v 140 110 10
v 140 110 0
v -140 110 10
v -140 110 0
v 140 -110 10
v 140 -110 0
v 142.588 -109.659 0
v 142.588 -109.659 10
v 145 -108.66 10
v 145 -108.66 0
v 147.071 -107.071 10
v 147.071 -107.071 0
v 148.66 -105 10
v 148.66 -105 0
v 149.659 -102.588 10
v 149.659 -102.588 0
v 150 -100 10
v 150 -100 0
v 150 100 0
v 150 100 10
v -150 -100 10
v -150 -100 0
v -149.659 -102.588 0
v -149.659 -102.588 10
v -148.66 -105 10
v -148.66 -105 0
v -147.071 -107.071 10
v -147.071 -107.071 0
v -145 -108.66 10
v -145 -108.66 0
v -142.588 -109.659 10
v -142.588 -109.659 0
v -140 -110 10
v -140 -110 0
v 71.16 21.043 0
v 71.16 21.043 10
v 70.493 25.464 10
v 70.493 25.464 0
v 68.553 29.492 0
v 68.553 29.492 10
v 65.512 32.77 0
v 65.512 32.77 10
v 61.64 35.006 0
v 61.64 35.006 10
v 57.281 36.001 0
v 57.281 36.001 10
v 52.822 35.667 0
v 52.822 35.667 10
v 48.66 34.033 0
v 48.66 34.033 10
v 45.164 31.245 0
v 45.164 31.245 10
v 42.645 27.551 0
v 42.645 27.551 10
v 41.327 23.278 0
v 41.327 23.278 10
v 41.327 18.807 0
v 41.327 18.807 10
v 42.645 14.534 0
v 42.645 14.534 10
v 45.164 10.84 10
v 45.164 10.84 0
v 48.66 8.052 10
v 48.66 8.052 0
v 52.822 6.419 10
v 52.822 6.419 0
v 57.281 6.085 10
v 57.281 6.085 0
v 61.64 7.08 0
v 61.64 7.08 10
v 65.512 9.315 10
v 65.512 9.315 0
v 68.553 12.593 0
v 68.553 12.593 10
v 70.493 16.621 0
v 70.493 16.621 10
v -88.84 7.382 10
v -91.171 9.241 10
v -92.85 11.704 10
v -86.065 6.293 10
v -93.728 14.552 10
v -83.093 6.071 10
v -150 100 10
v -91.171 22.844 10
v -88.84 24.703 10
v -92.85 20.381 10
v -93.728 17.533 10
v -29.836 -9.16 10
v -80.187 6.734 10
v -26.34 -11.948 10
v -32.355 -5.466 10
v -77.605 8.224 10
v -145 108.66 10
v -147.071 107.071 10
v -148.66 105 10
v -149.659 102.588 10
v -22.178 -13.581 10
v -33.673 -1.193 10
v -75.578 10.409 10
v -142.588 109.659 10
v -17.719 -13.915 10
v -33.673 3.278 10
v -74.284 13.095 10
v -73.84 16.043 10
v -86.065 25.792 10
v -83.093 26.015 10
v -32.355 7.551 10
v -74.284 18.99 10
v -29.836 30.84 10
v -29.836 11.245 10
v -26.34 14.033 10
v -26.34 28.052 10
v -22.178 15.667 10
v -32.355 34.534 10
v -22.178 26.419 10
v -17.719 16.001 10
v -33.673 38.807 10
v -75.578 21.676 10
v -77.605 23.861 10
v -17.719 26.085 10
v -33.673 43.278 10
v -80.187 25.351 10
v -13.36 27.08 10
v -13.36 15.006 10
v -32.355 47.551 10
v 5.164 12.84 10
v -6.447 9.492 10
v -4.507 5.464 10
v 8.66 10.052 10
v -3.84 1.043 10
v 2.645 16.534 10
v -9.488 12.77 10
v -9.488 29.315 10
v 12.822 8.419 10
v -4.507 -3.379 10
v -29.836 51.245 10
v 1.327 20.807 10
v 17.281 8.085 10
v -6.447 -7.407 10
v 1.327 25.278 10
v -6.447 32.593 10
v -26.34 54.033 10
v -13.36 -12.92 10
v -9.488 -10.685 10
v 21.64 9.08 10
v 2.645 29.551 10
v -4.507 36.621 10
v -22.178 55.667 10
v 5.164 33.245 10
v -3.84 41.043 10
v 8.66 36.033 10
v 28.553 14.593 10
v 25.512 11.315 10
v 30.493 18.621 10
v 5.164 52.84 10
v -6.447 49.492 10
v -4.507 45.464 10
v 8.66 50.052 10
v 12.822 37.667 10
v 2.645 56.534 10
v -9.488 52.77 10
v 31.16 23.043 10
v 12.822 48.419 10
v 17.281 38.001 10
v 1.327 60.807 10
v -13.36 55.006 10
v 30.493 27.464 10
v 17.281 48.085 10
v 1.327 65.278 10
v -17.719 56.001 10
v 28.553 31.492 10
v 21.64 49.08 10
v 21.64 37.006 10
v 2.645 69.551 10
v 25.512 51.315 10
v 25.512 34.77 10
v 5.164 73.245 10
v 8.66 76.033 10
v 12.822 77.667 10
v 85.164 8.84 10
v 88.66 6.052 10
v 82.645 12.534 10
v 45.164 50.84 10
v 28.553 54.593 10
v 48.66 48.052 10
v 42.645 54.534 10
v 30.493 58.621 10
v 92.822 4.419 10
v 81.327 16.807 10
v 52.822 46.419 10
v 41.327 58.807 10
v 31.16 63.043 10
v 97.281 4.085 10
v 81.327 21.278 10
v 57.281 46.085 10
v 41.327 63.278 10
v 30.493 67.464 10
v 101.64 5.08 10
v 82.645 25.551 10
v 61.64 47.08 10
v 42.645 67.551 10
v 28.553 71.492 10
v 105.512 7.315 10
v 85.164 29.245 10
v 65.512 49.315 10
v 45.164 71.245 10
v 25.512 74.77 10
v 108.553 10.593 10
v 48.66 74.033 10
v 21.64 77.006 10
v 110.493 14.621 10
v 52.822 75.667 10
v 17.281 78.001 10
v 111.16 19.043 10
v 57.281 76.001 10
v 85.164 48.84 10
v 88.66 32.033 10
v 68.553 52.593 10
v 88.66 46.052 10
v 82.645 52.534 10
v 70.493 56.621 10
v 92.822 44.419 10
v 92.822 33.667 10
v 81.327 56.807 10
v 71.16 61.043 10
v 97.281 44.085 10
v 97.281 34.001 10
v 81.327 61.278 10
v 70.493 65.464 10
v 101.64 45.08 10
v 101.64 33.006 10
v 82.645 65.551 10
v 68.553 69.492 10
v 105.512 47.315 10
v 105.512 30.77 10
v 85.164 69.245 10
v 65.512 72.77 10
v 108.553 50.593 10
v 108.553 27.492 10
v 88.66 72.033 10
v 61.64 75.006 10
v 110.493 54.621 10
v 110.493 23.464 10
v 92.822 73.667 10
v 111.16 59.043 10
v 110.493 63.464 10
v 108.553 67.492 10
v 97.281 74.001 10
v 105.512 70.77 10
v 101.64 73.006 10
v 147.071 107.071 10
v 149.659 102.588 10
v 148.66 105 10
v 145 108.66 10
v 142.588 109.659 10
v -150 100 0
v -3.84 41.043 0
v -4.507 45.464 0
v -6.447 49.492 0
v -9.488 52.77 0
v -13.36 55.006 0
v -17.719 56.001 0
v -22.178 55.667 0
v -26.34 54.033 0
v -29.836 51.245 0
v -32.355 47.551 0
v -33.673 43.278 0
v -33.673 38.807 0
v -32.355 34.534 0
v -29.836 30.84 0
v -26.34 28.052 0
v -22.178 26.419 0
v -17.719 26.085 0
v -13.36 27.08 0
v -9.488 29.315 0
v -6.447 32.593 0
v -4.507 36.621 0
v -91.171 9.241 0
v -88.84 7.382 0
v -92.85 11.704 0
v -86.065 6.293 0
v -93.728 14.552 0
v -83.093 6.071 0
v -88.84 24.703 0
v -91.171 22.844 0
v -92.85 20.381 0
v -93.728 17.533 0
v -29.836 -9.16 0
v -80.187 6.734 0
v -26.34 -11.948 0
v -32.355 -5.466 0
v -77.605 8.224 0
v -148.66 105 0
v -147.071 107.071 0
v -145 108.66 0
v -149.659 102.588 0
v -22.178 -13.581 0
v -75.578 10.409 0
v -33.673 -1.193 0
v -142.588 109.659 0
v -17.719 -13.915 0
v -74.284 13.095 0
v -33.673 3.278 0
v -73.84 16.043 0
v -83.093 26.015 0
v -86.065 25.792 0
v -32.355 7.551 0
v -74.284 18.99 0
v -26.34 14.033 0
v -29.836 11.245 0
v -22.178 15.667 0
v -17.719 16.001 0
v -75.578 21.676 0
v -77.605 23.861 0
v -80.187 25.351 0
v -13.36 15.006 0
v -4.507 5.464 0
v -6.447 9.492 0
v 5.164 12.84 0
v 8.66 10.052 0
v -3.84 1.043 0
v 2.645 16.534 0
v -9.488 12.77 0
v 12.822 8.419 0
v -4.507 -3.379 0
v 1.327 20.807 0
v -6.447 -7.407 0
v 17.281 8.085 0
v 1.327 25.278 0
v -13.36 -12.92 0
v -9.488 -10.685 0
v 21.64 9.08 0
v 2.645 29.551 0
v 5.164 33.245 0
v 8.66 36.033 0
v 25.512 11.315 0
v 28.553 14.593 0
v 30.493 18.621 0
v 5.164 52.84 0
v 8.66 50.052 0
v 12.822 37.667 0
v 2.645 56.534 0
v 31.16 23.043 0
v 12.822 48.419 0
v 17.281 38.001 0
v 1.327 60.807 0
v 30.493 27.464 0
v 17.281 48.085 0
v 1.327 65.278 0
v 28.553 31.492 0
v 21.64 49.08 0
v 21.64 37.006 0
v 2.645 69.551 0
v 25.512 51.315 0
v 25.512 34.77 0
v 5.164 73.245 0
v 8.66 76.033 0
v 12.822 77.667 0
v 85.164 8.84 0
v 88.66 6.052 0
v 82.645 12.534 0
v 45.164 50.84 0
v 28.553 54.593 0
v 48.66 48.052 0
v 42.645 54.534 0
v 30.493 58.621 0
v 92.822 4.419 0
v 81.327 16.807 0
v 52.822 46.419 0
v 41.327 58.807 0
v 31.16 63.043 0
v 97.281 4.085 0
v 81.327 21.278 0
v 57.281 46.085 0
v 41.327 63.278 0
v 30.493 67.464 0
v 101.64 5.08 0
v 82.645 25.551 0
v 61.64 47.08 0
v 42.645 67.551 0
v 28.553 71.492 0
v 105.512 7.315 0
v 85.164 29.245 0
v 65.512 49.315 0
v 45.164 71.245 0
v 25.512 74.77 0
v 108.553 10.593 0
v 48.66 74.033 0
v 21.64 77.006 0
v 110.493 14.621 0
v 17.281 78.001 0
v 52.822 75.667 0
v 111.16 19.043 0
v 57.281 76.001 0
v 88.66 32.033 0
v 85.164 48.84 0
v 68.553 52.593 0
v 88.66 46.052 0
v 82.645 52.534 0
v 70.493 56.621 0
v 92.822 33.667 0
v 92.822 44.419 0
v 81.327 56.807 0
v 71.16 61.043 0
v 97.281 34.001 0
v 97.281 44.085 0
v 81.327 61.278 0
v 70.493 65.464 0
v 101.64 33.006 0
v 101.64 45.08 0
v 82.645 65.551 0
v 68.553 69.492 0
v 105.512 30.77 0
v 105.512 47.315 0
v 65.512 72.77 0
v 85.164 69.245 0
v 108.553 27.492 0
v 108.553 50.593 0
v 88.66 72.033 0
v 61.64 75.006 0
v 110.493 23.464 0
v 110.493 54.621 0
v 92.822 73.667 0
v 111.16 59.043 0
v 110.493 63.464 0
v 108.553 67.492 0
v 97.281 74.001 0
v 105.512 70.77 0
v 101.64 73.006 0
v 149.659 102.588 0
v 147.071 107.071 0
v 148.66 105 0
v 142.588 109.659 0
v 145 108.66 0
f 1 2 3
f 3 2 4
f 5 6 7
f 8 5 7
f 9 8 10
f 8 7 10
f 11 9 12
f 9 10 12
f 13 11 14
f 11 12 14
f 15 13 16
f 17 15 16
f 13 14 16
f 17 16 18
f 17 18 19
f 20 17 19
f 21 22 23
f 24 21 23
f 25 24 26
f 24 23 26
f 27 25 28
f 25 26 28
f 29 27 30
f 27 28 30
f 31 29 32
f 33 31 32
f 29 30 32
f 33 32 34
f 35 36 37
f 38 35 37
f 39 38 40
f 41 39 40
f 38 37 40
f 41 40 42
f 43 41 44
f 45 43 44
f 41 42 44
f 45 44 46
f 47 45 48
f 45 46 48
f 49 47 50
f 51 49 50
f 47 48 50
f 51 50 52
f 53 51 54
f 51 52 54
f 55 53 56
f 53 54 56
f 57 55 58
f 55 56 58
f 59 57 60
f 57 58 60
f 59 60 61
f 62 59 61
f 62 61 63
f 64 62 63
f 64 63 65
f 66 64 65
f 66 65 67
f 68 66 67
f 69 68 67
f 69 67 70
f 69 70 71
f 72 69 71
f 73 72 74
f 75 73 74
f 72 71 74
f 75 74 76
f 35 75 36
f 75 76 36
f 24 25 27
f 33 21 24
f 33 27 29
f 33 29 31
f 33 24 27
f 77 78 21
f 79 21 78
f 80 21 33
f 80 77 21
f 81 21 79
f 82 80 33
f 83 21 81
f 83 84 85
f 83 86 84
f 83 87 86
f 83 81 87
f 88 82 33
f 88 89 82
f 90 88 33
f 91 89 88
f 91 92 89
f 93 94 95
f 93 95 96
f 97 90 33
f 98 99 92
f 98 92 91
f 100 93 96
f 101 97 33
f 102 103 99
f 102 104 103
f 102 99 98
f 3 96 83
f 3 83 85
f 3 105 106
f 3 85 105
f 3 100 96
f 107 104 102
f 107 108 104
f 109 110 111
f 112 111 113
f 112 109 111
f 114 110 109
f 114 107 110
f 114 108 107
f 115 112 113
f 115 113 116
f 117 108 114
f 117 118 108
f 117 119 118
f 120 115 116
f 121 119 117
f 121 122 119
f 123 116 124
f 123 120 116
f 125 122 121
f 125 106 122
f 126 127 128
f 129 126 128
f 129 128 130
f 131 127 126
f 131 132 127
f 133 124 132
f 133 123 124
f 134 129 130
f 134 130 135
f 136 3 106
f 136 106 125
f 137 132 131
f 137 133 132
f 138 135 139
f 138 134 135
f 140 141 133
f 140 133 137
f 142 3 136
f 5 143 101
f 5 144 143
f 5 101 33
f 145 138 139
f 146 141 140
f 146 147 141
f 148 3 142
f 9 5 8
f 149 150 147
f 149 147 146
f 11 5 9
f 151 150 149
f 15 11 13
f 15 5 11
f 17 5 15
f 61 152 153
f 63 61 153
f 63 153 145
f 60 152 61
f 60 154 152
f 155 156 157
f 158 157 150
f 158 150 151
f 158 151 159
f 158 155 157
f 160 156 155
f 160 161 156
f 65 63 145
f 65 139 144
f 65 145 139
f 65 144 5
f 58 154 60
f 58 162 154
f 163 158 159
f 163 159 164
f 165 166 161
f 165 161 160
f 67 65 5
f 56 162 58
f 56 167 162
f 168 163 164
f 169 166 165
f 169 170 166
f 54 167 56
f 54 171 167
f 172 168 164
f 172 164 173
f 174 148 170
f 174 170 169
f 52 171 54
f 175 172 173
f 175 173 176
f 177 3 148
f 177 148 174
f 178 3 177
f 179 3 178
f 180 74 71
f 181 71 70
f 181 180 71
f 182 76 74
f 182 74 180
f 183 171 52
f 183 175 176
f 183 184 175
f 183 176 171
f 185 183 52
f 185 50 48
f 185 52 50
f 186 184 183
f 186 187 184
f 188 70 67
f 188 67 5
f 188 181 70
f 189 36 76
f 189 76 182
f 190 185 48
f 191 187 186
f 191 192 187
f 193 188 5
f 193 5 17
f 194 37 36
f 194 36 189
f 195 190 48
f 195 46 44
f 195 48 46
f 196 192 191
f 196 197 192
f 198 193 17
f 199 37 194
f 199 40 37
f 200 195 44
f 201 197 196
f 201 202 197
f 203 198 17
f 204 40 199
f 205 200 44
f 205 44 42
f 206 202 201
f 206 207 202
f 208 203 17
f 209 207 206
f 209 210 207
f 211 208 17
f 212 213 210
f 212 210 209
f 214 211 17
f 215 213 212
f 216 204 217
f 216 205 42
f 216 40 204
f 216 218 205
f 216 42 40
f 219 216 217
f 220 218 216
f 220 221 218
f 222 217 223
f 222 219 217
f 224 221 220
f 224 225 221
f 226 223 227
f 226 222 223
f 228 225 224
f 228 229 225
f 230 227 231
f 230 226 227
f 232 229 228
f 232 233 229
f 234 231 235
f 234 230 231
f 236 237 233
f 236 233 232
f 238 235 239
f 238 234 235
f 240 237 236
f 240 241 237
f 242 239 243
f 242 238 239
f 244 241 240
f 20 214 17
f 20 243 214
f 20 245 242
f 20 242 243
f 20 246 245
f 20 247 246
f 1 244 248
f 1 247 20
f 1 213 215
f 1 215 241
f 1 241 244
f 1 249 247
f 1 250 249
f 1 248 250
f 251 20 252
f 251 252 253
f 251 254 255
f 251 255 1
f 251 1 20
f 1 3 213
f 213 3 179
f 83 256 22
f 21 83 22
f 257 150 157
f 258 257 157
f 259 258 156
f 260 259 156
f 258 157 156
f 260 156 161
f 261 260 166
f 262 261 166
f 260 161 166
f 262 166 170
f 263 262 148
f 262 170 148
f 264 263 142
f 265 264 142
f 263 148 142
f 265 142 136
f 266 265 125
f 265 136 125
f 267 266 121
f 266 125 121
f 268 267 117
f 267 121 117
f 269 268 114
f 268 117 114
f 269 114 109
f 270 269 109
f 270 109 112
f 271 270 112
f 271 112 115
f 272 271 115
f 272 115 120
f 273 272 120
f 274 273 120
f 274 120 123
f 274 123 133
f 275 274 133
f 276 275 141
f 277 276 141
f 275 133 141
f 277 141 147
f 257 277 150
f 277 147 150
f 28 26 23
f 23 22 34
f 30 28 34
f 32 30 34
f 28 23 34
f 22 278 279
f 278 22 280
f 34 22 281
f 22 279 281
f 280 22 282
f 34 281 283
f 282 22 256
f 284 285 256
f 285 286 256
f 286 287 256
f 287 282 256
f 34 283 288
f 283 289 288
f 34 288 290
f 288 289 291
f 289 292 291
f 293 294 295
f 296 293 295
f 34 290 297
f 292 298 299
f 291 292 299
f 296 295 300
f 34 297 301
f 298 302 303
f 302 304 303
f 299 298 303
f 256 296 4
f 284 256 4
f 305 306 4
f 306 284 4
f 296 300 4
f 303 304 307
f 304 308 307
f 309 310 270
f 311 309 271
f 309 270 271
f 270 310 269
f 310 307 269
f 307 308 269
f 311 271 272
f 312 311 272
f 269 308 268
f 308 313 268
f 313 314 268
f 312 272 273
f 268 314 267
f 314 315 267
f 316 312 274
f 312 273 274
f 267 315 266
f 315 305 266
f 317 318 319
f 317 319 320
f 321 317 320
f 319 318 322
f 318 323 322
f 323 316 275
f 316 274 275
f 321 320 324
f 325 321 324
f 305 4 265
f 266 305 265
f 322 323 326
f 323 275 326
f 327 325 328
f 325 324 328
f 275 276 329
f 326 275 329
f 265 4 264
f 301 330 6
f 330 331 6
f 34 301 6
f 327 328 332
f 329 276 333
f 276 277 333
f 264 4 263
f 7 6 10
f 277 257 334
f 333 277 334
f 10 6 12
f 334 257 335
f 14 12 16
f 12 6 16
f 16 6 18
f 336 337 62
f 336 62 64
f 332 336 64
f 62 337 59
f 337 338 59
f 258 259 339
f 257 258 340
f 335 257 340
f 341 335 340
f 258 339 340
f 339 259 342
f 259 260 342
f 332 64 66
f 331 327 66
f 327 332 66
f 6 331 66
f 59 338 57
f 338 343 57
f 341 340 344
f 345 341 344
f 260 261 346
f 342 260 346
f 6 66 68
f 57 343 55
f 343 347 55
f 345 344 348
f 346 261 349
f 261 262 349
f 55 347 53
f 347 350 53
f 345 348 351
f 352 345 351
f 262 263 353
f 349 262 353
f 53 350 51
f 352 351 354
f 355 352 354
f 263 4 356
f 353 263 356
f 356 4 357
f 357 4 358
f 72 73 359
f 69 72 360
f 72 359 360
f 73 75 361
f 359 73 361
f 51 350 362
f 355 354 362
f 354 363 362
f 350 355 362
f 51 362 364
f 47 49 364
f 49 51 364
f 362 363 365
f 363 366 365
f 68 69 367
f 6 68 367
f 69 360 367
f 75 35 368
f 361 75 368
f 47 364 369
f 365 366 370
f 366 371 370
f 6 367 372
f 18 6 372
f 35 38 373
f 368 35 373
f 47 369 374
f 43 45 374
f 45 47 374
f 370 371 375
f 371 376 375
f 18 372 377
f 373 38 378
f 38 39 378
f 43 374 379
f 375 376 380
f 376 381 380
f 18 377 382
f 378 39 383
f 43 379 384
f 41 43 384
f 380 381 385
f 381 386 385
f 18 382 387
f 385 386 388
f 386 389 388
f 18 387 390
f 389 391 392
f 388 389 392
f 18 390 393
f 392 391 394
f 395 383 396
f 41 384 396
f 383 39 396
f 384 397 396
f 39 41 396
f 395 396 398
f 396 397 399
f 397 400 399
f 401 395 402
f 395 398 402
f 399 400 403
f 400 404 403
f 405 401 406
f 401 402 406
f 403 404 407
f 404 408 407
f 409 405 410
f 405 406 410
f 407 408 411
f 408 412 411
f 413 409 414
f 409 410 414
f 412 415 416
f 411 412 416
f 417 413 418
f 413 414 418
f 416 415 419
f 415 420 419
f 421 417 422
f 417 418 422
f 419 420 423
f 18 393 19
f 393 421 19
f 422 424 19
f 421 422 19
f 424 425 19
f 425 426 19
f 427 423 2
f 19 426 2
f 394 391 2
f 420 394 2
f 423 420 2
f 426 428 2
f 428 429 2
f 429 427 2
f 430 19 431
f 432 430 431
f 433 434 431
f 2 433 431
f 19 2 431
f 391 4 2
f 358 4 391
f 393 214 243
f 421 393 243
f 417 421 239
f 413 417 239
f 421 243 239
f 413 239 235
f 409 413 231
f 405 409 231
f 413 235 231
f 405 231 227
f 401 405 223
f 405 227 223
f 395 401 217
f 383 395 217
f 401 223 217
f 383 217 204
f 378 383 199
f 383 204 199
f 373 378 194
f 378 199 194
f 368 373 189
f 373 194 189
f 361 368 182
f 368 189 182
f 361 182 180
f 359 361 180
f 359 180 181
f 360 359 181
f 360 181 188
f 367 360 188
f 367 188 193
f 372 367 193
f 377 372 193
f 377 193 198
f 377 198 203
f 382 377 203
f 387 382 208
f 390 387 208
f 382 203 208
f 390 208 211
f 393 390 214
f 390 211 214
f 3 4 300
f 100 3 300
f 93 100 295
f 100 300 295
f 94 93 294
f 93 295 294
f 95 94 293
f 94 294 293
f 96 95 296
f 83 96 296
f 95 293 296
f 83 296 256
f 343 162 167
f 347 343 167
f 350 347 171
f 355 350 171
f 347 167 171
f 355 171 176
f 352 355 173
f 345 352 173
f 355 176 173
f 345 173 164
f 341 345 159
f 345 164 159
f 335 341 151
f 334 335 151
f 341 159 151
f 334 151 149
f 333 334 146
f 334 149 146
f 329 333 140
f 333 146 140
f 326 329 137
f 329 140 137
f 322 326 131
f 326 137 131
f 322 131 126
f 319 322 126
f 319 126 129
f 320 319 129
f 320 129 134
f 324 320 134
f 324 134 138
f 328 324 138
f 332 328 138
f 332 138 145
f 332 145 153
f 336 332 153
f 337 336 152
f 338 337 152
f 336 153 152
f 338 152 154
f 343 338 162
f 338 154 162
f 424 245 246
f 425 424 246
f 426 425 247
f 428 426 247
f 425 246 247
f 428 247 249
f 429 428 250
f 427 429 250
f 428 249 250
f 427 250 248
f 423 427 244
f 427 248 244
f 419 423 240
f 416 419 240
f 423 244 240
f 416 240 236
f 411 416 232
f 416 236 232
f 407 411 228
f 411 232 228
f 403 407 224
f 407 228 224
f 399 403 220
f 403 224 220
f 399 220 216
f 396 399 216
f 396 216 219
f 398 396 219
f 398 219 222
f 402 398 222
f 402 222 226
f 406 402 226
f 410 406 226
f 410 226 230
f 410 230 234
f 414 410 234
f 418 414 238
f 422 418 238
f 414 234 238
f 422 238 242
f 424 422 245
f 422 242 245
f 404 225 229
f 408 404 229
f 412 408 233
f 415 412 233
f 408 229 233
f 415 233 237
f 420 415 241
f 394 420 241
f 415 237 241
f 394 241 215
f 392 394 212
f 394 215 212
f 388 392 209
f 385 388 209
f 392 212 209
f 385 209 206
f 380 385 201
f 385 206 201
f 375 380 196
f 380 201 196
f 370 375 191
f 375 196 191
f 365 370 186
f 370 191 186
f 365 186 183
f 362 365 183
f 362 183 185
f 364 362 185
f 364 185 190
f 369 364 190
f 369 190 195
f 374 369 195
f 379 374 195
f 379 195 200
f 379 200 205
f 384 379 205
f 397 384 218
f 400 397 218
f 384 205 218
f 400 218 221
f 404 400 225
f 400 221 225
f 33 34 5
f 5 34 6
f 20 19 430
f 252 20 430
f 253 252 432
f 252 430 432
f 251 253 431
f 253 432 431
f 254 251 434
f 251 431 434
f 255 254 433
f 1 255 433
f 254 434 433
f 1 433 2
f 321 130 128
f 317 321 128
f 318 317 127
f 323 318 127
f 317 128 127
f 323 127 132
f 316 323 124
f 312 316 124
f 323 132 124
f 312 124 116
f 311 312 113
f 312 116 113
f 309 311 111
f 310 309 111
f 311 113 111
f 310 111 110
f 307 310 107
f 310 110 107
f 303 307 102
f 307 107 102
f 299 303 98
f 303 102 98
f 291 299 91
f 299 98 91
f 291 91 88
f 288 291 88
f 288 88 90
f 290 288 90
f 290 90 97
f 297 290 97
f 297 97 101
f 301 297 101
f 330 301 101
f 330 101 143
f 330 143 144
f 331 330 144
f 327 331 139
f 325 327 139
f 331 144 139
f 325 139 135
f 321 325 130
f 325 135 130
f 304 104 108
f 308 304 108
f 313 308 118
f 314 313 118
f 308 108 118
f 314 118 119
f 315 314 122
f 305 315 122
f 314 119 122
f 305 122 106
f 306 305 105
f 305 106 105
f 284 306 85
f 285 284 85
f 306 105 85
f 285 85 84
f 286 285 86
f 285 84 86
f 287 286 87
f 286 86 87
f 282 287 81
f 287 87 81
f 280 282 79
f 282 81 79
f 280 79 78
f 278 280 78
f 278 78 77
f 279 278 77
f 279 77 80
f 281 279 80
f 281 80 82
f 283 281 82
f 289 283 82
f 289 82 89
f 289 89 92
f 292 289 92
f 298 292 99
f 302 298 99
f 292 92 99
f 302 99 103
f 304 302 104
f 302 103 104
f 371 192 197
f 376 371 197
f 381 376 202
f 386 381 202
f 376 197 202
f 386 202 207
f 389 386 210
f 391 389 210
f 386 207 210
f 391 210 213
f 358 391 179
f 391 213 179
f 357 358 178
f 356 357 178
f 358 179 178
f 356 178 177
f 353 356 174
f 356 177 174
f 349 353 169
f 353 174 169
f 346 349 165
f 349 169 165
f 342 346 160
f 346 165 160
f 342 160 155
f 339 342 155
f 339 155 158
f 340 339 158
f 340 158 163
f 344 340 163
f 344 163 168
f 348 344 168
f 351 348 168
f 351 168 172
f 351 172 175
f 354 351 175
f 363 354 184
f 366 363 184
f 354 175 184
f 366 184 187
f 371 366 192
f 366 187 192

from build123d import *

# Parameters (mm, degrees)
F1_DEPTH = 10
F2_R     = 10
F2_R_2   = 15
F3_DEPTH = 10


with BuildPart() as f1:
    # F0 (on Top) → F1 (new body)
    with BuildSketch(Plane.XY):
        with BuildLine():
            Line((140, 110), (-140, 110))
            ThreePointArc((-140, 110), (-147.071068, 107.071068), (-150, 100))
            Line((-150, 100), (-150, -100))
            ThreePointArc((-150, -100), (-147.071068, -107.071068), (-140, -110))
            Line((-140, -110), (140, -110))
            ThreePointArc((140, -110), (147.071068, -107.071068), (150, -100))
            Line((150, -100), (150, 100))
            ThreePointArc((150, 100), (147.071068, 107.071068), (140, 110))
        make_face()
    extrude(amount=F1_DEPTH)

    # F2 (on face) → F3 (cut)
    with BuildSketch(Plane.XY.offset(10)):
        with Locations((-83.84011, 16.042637)):
            Circle(F2_R)
        with Locations((-18.84011, 41.042637)):
            Circle(F2_R_2)
        with Locations((16.15989, 63.042637)):
            Circle(F2_R_2)
        with Locations((56.15989, 61.042637)):
            Circle(F2_R_2)
        with Locations((96.15989, 59.042637)):
            Circle(F2_R_2)
        with Locations((96.15989, 19.042637)):
            Circle(F2_R_2)
        with Locations((56.15989, 21.042637)):
            Circle(F2_R_2)
        with Locations((16.15989, 23.042637)):
            Circle(F2_R_2)
        with Locations((-18.84011, 1.042637)):
            Circle(F2_R_2)
    extrude(amount=-F3_DEPTH, mode=Mode.SUBTRACT)


solid = f1.part
